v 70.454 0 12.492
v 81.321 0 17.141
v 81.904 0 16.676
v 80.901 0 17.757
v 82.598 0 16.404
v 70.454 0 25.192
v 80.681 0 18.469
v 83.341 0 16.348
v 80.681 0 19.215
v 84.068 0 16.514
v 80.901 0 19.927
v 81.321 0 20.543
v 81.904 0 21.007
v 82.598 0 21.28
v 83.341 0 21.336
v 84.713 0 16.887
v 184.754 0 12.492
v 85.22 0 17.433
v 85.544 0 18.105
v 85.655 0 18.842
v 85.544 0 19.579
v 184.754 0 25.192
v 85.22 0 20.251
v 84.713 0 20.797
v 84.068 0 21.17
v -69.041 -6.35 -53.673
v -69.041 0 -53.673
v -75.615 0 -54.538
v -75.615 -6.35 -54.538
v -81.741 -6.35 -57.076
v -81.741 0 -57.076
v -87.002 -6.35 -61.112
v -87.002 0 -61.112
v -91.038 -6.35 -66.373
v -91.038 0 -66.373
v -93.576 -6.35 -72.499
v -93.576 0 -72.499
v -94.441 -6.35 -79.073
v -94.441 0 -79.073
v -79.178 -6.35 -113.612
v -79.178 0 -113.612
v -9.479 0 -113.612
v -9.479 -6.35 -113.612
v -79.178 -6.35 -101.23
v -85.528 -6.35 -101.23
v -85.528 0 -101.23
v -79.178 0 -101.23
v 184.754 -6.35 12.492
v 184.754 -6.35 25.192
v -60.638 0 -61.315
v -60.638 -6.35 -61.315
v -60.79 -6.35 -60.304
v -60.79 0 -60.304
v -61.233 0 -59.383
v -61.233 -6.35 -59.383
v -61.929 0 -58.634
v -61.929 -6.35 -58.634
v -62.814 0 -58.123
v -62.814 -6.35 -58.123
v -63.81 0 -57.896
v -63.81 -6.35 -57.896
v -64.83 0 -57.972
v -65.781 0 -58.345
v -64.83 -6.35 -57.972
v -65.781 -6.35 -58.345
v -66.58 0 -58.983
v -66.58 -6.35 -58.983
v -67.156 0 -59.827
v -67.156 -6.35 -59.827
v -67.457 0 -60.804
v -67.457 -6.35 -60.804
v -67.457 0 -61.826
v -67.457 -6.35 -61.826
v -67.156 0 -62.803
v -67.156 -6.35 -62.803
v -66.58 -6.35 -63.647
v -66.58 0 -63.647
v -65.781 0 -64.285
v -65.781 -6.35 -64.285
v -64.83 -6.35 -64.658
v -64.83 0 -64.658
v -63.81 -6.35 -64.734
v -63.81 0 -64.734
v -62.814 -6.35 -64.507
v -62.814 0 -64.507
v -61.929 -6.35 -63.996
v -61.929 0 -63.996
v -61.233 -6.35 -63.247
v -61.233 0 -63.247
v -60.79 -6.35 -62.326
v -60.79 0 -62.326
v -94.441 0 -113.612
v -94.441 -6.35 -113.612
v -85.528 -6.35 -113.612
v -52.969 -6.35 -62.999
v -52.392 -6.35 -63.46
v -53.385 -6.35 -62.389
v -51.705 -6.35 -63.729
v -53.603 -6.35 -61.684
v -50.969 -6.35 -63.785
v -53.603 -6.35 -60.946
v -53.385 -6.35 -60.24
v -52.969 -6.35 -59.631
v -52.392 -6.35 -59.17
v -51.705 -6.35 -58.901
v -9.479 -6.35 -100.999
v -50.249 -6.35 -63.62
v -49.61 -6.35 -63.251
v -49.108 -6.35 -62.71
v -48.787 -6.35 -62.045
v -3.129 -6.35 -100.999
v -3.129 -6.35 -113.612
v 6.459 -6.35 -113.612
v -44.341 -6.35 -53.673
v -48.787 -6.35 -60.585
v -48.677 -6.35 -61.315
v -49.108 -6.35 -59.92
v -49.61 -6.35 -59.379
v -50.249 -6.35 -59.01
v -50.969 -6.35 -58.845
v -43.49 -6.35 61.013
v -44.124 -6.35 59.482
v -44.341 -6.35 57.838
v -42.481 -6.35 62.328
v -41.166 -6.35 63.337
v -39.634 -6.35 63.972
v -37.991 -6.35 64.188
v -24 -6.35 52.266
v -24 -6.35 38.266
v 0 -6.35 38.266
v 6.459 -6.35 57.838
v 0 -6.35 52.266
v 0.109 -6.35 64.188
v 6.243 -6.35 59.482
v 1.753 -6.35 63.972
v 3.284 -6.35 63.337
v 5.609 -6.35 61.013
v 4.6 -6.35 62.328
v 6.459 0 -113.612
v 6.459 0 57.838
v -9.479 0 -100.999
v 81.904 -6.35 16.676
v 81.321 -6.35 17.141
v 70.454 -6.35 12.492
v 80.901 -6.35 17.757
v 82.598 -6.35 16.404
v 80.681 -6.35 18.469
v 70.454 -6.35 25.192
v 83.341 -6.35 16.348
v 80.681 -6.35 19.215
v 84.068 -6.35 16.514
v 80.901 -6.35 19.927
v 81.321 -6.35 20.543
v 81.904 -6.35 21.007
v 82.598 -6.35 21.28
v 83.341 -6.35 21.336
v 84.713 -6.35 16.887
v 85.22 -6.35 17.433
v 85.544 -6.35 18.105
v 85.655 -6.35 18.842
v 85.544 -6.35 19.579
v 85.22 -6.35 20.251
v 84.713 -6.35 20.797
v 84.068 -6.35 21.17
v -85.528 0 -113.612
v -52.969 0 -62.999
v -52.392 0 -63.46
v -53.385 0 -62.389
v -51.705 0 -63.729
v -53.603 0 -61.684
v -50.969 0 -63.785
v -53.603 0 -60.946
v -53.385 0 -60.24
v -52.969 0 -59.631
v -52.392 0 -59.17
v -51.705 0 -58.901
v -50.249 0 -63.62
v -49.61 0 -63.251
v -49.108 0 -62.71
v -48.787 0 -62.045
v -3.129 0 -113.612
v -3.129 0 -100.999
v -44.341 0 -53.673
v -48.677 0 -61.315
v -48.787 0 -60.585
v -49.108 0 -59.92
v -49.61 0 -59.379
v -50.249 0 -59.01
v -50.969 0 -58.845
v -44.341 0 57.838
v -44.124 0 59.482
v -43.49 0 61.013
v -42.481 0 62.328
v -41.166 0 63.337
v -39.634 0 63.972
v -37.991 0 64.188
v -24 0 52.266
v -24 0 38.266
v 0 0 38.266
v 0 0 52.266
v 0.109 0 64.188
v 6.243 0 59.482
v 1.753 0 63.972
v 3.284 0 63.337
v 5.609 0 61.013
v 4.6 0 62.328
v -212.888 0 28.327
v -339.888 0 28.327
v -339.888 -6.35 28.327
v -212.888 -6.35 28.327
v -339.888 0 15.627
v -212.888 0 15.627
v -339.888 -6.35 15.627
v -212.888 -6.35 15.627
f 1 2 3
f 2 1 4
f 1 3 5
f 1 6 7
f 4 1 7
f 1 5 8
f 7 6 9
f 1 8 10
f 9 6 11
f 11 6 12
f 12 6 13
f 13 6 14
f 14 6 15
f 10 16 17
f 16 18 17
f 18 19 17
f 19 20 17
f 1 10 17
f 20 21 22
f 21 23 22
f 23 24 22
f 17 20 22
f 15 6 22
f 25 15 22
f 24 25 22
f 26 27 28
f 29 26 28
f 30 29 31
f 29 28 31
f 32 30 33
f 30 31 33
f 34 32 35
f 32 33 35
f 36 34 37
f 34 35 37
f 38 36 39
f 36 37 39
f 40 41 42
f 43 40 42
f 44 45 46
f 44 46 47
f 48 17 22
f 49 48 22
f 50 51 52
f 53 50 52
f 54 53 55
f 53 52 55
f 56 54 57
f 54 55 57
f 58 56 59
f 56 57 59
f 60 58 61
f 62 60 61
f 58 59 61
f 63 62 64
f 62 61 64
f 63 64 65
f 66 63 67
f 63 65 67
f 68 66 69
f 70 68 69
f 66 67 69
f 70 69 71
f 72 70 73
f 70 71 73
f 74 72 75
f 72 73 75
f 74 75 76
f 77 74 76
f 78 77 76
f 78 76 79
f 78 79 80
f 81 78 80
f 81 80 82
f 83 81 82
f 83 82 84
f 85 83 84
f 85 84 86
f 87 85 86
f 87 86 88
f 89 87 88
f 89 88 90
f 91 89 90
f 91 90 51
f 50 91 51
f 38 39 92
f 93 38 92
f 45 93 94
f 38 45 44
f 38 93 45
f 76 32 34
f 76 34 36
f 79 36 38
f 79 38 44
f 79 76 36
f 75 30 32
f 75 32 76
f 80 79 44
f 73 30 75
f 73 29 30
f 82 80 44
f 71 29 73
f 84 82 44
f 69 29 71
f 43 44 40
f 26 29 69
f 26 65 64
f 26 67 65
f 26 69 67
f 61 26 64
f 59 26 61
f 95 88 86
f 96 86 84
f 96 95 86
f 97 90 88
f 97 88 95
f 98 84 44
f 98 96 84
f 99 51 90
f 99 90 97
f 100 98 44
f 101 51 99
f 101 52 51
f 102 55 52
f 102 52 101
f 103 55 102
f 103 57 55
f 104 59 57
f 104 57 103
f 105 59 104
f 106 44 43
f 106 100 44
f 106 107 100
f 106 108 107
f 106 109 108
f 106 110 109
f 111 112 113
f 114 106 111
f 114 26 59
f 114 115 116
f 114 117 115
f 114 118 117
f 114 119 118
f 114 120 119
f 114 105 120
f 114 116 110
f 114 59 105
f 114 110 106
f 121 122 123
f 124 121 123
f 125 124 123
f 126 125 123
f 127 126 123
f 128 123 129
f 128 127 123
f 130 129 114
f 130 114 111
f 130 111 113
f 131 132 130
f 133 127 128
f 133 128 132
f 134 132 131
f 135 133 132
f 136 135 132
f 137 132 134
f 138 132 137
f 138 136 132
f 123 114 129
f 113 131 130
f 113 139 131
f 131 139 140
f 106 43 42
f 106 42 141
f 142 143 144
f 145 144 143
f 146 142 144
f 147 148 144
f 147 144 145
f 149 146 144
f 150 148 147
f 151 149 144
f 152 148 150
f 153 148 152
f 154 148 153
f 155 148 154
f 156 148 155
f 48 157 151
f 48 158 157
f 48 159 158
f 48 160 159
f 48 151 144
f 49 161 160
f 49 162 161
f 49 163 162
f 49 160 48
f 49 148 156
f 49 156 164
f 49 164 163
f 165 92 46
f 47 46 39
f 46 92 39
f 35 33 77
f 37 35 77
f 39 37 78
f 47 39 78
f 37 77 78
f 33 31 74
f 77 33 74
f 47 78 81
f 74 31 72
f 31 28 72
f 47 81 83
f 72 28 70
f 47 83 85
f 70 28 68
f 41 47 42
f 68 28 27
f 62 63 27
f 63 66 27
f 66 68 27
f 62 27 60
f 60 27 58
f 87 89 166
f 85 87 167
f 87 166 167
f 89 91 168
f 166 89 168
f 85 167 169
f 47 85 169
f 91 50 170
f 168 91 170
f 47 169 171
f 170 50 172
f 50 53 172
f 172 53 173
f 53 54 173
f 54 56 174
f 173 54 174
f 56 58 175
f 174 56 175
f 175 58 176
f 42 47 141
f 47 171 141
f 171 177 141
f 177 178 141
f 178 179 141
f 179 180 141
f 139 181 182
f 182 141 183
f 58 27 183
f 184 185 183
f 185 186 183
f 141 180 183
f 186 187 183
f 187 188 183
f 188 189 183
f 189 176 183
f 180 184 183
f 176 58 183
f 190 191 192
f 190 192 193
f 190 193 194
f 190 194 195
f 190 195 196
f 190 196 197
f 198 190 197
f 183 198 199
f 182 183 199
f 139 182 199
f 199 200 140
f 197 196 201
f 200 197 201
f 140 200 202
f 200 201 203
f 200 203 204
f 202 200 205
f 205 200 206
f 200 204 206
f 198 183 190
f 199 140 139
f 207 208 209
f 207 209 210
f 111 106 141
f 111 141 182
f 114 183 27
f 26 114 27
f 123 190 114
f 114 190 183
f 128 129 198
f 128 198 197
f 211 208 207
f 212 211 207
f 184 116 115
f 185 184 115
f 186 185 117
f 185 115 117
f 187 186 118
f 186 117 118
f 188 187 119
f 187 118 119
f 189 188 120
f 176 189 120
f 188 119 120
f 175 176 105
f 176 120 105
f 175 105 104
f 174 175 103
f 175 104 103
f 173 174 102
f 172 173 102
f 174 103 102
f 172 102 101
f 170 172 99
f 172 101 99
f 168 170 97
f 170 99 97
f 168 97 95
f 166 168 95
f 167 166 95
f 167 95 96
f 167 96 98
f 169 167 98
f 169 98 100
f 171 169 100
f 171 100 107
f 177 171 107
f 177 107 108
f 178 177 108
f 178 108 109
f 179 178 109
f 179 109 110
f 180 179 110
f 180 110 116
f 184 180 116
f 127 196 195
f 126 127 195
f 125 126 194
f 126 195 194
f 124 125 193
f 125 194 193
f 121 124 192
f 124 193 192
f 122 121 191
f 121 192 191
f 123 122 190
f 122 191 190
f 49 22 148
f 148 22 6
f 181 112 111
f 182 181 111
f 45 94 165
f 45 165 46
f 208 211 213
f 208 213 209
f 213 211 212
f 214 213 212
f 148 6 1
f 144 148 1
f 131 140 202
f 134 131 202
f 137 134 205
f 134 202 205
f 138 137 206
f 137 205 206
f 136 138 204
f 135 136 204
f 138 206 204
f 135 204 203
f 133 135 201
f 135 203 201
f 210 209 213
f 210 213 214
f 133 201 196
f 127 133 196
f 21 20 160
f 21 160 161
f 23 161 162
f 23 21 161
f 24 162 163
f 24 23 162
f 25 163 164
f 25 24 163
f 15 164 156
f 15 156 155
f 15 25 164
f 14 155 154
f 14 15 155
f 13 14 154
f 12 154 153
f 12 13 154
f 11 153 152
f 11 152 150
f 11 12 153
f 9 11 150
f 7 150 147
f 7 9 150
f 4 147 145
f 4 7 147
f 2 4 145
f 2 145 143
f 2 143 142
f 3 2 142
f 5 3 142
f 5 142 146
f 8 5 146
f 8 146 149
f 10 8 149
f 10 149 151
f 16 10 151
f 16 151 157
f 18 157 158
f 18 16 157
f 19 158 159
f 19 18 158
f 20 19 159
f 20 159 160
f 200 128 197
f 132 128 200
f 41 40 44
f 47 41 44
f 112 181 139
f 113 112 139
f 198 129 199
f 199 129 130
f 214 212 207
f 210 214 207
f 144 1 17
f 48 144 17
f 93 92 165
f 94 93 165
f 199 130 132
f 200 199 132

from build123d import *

# Parameters (mm, degrees)
F0_W      = 6.2484
F0_H      = 12.7
F1_DEPTH  = 6.35
F2_R      = 2.50063
F2_W      = 0.635
F2_H      = 0.635
F2_W_2    = 0.64686688
F3_DEPTH  = 6.35
F5_W      = 6.35
F5_H      = 12.7
F6_DEPTH  = 18.796
F7_W      = 127
F7_H      = 12.7
F8_DEPTH  = 6.35
F9_R      = 2.4765
F9_R_2    = 3.429
F10_DEPTH = 10.668
F11_W     = 24
F11_H     = 14
F12_DEPTH = 12.6


with BuildPart() as f1:
    # F0 (on Front) → F1 (new body)
    with BuildSketch(Plane.XZ):
        with BuildLine():
            Line((0.1094298816, 64.1882125348), (-37.9905701184, 64.1882125348))
            ThreePointArc((-37.9905701184, 64.1882125348), (-42.4806981789, 62.3283405953), (-44.3405701184, 57.8382125348))
            Line((-44.3405701184, 57.8382125348), (-44.3405701184, -53.6726415157))
            Line((-44.3405701184, -53.6726415157), (-44.3405701184, -113.6117874652))
            Line((-44.3405701184, -113.6117874652), (-3.5291565582, -113.6117874652))
            Line((-3.5291565582, -113.6117874652), (-3.5291565582, -100.9117874652))
            Line((-3.5291565582, -100.9117874652), (2.7192434418, -100.9117874652))
            Line((2.7192434418, -100.9117874652), (2.7192434418, -113.6117874652))
            Line((2.7192434418, -113.6117874652), (6.4594298816, -113.6117874652))
            Line((6.4594298816, -113.6117874652), (6.4594298816, 57.8382125348))
            ThreePointArc((6.4594298816, 57.8382125348), (4.5995579422, 62.3283405953), (0.1094298816, 64.1882125348))
        make_face()
        with BuildLine():
            Line((-44.3405701184, -113.6117874652), (-44.3405701184, -53.6726415157))
            Line((-44.3405701184, -53.6726415157), (-69.0410040975, -53.6726415157))
            ThreePointArc((-69.0410040975, -53.6726415157), (-87.0015163396, -61.1121292736), (-94.4410040975, -79.0726415157))
            Line((-94.4410040975, -79.0726415157), (-94.4410040975, -113.6117874652))
            Line((-94.4410040975, -113.6117874652), (-89.2475768924, -113.6117874652))
            Line((-89.2475768924, -113.6117874652), (-89.2475768924, -100.9117874652))
            Line((-89.2475768924, -100.9117874652), (-82.9991768924, -100.9117874652))
            Line((-82.9991768924, -100.9117874652), (-82.9991768924, -113.6117874652))
            Line((-82.9991768924, -113.6117874652), (-44.3405701184, -113.6117874652))
        make_face()
        with Locations((-0.4049565582, -107.2617874652)):
            Rectangle(F0_W, F0_H)
        with Locations((-86.1233768924, -107.2617874652)):
            Rectangle(F0_W, F0_H)
    extrude(amount=F1_DEPTH)

    # F5 (on face) → F6 (cut)
    with BuildSketch(Plane.XZ.offset(6.35)):
        with Locations((-82.3533010844, -107.5799518967)):
            Rectangle(F5_W, F5_H)
        with Locations((-6.3044726846, -107.3489762023)):
            Rectangle(F5_W, F5_H)
    extrude(amount=-F6_DEPTH, mode=Mode.SUBTRACT)

    # F9 (on face) → F10 (cut)
    with BuildSketch(Plane.XZ.offset(6.35)):
        with Locations((-51.1537013053, -61.3149702549)):
            Circle(F9_R)
        with Locations((-64.0666323717, -61.3149702549)):
            Circle(F9_R_2)
    extrude(amount=-F10_DEPTH, mode=Mode.SUBTRACT)

    # F11 (on face) → F12 (cut)
    with BuildSketch(Plane.XZ.offset(6.35)):
        with Locations((-12, 45.2657650553)):
            Rectangle(F11_W, F11_H)
    extrude(amount=-F12_DEPTH, mode=Mode.SUBTRACT)


with BuildPart() as f3:
    # F2 (on Front) → F3 (new body)
    with BuildSketch(Plane.XZ):
        Polygon((174.2882113361, 25.1918840105), (70.4541908026, 25.1918840105), (70.4541908026, 12.4918840105), (184.7541908026, 12.4918840105), (184.7541908026, 25.1918840105), (180.8028519154, 25.1918840105), (180.8028519154, 24.5568840105), (180.1559850354, 24.5568840105), (180.1559850354, 25.1918840105), (174.9232113361, 25.1918840105), (174.9232113361, 24.5568840105), (174.2882113361, 24.5568840105), align=None)
        with Locations((83.1541908026, 18.8418840105)):
            Circle(F2_R, mode=Mode.SUBTRACT)
        with Locations((174.6057113361, 24.8743840105)):
            Rectangle(F2_W, F2_H)
        with Locations((180.4794184754, 24.8743840105)):
            Rectangle(F2_W_2, F2_H)
    extrude(amount=F3_DEPTH)


with BuildPart() as f8:
    # F7 (on Front) → F8 (new body)
    with BuildSketch(Plane.XZ):
        with Locations((-276.3879820704, 21.9772367024)):
            Rectangle(F7_W, F7_H)
    extrude(amount=F8_DEPTH)


solid = Compound([f1.part, f3.part, f8.part])
